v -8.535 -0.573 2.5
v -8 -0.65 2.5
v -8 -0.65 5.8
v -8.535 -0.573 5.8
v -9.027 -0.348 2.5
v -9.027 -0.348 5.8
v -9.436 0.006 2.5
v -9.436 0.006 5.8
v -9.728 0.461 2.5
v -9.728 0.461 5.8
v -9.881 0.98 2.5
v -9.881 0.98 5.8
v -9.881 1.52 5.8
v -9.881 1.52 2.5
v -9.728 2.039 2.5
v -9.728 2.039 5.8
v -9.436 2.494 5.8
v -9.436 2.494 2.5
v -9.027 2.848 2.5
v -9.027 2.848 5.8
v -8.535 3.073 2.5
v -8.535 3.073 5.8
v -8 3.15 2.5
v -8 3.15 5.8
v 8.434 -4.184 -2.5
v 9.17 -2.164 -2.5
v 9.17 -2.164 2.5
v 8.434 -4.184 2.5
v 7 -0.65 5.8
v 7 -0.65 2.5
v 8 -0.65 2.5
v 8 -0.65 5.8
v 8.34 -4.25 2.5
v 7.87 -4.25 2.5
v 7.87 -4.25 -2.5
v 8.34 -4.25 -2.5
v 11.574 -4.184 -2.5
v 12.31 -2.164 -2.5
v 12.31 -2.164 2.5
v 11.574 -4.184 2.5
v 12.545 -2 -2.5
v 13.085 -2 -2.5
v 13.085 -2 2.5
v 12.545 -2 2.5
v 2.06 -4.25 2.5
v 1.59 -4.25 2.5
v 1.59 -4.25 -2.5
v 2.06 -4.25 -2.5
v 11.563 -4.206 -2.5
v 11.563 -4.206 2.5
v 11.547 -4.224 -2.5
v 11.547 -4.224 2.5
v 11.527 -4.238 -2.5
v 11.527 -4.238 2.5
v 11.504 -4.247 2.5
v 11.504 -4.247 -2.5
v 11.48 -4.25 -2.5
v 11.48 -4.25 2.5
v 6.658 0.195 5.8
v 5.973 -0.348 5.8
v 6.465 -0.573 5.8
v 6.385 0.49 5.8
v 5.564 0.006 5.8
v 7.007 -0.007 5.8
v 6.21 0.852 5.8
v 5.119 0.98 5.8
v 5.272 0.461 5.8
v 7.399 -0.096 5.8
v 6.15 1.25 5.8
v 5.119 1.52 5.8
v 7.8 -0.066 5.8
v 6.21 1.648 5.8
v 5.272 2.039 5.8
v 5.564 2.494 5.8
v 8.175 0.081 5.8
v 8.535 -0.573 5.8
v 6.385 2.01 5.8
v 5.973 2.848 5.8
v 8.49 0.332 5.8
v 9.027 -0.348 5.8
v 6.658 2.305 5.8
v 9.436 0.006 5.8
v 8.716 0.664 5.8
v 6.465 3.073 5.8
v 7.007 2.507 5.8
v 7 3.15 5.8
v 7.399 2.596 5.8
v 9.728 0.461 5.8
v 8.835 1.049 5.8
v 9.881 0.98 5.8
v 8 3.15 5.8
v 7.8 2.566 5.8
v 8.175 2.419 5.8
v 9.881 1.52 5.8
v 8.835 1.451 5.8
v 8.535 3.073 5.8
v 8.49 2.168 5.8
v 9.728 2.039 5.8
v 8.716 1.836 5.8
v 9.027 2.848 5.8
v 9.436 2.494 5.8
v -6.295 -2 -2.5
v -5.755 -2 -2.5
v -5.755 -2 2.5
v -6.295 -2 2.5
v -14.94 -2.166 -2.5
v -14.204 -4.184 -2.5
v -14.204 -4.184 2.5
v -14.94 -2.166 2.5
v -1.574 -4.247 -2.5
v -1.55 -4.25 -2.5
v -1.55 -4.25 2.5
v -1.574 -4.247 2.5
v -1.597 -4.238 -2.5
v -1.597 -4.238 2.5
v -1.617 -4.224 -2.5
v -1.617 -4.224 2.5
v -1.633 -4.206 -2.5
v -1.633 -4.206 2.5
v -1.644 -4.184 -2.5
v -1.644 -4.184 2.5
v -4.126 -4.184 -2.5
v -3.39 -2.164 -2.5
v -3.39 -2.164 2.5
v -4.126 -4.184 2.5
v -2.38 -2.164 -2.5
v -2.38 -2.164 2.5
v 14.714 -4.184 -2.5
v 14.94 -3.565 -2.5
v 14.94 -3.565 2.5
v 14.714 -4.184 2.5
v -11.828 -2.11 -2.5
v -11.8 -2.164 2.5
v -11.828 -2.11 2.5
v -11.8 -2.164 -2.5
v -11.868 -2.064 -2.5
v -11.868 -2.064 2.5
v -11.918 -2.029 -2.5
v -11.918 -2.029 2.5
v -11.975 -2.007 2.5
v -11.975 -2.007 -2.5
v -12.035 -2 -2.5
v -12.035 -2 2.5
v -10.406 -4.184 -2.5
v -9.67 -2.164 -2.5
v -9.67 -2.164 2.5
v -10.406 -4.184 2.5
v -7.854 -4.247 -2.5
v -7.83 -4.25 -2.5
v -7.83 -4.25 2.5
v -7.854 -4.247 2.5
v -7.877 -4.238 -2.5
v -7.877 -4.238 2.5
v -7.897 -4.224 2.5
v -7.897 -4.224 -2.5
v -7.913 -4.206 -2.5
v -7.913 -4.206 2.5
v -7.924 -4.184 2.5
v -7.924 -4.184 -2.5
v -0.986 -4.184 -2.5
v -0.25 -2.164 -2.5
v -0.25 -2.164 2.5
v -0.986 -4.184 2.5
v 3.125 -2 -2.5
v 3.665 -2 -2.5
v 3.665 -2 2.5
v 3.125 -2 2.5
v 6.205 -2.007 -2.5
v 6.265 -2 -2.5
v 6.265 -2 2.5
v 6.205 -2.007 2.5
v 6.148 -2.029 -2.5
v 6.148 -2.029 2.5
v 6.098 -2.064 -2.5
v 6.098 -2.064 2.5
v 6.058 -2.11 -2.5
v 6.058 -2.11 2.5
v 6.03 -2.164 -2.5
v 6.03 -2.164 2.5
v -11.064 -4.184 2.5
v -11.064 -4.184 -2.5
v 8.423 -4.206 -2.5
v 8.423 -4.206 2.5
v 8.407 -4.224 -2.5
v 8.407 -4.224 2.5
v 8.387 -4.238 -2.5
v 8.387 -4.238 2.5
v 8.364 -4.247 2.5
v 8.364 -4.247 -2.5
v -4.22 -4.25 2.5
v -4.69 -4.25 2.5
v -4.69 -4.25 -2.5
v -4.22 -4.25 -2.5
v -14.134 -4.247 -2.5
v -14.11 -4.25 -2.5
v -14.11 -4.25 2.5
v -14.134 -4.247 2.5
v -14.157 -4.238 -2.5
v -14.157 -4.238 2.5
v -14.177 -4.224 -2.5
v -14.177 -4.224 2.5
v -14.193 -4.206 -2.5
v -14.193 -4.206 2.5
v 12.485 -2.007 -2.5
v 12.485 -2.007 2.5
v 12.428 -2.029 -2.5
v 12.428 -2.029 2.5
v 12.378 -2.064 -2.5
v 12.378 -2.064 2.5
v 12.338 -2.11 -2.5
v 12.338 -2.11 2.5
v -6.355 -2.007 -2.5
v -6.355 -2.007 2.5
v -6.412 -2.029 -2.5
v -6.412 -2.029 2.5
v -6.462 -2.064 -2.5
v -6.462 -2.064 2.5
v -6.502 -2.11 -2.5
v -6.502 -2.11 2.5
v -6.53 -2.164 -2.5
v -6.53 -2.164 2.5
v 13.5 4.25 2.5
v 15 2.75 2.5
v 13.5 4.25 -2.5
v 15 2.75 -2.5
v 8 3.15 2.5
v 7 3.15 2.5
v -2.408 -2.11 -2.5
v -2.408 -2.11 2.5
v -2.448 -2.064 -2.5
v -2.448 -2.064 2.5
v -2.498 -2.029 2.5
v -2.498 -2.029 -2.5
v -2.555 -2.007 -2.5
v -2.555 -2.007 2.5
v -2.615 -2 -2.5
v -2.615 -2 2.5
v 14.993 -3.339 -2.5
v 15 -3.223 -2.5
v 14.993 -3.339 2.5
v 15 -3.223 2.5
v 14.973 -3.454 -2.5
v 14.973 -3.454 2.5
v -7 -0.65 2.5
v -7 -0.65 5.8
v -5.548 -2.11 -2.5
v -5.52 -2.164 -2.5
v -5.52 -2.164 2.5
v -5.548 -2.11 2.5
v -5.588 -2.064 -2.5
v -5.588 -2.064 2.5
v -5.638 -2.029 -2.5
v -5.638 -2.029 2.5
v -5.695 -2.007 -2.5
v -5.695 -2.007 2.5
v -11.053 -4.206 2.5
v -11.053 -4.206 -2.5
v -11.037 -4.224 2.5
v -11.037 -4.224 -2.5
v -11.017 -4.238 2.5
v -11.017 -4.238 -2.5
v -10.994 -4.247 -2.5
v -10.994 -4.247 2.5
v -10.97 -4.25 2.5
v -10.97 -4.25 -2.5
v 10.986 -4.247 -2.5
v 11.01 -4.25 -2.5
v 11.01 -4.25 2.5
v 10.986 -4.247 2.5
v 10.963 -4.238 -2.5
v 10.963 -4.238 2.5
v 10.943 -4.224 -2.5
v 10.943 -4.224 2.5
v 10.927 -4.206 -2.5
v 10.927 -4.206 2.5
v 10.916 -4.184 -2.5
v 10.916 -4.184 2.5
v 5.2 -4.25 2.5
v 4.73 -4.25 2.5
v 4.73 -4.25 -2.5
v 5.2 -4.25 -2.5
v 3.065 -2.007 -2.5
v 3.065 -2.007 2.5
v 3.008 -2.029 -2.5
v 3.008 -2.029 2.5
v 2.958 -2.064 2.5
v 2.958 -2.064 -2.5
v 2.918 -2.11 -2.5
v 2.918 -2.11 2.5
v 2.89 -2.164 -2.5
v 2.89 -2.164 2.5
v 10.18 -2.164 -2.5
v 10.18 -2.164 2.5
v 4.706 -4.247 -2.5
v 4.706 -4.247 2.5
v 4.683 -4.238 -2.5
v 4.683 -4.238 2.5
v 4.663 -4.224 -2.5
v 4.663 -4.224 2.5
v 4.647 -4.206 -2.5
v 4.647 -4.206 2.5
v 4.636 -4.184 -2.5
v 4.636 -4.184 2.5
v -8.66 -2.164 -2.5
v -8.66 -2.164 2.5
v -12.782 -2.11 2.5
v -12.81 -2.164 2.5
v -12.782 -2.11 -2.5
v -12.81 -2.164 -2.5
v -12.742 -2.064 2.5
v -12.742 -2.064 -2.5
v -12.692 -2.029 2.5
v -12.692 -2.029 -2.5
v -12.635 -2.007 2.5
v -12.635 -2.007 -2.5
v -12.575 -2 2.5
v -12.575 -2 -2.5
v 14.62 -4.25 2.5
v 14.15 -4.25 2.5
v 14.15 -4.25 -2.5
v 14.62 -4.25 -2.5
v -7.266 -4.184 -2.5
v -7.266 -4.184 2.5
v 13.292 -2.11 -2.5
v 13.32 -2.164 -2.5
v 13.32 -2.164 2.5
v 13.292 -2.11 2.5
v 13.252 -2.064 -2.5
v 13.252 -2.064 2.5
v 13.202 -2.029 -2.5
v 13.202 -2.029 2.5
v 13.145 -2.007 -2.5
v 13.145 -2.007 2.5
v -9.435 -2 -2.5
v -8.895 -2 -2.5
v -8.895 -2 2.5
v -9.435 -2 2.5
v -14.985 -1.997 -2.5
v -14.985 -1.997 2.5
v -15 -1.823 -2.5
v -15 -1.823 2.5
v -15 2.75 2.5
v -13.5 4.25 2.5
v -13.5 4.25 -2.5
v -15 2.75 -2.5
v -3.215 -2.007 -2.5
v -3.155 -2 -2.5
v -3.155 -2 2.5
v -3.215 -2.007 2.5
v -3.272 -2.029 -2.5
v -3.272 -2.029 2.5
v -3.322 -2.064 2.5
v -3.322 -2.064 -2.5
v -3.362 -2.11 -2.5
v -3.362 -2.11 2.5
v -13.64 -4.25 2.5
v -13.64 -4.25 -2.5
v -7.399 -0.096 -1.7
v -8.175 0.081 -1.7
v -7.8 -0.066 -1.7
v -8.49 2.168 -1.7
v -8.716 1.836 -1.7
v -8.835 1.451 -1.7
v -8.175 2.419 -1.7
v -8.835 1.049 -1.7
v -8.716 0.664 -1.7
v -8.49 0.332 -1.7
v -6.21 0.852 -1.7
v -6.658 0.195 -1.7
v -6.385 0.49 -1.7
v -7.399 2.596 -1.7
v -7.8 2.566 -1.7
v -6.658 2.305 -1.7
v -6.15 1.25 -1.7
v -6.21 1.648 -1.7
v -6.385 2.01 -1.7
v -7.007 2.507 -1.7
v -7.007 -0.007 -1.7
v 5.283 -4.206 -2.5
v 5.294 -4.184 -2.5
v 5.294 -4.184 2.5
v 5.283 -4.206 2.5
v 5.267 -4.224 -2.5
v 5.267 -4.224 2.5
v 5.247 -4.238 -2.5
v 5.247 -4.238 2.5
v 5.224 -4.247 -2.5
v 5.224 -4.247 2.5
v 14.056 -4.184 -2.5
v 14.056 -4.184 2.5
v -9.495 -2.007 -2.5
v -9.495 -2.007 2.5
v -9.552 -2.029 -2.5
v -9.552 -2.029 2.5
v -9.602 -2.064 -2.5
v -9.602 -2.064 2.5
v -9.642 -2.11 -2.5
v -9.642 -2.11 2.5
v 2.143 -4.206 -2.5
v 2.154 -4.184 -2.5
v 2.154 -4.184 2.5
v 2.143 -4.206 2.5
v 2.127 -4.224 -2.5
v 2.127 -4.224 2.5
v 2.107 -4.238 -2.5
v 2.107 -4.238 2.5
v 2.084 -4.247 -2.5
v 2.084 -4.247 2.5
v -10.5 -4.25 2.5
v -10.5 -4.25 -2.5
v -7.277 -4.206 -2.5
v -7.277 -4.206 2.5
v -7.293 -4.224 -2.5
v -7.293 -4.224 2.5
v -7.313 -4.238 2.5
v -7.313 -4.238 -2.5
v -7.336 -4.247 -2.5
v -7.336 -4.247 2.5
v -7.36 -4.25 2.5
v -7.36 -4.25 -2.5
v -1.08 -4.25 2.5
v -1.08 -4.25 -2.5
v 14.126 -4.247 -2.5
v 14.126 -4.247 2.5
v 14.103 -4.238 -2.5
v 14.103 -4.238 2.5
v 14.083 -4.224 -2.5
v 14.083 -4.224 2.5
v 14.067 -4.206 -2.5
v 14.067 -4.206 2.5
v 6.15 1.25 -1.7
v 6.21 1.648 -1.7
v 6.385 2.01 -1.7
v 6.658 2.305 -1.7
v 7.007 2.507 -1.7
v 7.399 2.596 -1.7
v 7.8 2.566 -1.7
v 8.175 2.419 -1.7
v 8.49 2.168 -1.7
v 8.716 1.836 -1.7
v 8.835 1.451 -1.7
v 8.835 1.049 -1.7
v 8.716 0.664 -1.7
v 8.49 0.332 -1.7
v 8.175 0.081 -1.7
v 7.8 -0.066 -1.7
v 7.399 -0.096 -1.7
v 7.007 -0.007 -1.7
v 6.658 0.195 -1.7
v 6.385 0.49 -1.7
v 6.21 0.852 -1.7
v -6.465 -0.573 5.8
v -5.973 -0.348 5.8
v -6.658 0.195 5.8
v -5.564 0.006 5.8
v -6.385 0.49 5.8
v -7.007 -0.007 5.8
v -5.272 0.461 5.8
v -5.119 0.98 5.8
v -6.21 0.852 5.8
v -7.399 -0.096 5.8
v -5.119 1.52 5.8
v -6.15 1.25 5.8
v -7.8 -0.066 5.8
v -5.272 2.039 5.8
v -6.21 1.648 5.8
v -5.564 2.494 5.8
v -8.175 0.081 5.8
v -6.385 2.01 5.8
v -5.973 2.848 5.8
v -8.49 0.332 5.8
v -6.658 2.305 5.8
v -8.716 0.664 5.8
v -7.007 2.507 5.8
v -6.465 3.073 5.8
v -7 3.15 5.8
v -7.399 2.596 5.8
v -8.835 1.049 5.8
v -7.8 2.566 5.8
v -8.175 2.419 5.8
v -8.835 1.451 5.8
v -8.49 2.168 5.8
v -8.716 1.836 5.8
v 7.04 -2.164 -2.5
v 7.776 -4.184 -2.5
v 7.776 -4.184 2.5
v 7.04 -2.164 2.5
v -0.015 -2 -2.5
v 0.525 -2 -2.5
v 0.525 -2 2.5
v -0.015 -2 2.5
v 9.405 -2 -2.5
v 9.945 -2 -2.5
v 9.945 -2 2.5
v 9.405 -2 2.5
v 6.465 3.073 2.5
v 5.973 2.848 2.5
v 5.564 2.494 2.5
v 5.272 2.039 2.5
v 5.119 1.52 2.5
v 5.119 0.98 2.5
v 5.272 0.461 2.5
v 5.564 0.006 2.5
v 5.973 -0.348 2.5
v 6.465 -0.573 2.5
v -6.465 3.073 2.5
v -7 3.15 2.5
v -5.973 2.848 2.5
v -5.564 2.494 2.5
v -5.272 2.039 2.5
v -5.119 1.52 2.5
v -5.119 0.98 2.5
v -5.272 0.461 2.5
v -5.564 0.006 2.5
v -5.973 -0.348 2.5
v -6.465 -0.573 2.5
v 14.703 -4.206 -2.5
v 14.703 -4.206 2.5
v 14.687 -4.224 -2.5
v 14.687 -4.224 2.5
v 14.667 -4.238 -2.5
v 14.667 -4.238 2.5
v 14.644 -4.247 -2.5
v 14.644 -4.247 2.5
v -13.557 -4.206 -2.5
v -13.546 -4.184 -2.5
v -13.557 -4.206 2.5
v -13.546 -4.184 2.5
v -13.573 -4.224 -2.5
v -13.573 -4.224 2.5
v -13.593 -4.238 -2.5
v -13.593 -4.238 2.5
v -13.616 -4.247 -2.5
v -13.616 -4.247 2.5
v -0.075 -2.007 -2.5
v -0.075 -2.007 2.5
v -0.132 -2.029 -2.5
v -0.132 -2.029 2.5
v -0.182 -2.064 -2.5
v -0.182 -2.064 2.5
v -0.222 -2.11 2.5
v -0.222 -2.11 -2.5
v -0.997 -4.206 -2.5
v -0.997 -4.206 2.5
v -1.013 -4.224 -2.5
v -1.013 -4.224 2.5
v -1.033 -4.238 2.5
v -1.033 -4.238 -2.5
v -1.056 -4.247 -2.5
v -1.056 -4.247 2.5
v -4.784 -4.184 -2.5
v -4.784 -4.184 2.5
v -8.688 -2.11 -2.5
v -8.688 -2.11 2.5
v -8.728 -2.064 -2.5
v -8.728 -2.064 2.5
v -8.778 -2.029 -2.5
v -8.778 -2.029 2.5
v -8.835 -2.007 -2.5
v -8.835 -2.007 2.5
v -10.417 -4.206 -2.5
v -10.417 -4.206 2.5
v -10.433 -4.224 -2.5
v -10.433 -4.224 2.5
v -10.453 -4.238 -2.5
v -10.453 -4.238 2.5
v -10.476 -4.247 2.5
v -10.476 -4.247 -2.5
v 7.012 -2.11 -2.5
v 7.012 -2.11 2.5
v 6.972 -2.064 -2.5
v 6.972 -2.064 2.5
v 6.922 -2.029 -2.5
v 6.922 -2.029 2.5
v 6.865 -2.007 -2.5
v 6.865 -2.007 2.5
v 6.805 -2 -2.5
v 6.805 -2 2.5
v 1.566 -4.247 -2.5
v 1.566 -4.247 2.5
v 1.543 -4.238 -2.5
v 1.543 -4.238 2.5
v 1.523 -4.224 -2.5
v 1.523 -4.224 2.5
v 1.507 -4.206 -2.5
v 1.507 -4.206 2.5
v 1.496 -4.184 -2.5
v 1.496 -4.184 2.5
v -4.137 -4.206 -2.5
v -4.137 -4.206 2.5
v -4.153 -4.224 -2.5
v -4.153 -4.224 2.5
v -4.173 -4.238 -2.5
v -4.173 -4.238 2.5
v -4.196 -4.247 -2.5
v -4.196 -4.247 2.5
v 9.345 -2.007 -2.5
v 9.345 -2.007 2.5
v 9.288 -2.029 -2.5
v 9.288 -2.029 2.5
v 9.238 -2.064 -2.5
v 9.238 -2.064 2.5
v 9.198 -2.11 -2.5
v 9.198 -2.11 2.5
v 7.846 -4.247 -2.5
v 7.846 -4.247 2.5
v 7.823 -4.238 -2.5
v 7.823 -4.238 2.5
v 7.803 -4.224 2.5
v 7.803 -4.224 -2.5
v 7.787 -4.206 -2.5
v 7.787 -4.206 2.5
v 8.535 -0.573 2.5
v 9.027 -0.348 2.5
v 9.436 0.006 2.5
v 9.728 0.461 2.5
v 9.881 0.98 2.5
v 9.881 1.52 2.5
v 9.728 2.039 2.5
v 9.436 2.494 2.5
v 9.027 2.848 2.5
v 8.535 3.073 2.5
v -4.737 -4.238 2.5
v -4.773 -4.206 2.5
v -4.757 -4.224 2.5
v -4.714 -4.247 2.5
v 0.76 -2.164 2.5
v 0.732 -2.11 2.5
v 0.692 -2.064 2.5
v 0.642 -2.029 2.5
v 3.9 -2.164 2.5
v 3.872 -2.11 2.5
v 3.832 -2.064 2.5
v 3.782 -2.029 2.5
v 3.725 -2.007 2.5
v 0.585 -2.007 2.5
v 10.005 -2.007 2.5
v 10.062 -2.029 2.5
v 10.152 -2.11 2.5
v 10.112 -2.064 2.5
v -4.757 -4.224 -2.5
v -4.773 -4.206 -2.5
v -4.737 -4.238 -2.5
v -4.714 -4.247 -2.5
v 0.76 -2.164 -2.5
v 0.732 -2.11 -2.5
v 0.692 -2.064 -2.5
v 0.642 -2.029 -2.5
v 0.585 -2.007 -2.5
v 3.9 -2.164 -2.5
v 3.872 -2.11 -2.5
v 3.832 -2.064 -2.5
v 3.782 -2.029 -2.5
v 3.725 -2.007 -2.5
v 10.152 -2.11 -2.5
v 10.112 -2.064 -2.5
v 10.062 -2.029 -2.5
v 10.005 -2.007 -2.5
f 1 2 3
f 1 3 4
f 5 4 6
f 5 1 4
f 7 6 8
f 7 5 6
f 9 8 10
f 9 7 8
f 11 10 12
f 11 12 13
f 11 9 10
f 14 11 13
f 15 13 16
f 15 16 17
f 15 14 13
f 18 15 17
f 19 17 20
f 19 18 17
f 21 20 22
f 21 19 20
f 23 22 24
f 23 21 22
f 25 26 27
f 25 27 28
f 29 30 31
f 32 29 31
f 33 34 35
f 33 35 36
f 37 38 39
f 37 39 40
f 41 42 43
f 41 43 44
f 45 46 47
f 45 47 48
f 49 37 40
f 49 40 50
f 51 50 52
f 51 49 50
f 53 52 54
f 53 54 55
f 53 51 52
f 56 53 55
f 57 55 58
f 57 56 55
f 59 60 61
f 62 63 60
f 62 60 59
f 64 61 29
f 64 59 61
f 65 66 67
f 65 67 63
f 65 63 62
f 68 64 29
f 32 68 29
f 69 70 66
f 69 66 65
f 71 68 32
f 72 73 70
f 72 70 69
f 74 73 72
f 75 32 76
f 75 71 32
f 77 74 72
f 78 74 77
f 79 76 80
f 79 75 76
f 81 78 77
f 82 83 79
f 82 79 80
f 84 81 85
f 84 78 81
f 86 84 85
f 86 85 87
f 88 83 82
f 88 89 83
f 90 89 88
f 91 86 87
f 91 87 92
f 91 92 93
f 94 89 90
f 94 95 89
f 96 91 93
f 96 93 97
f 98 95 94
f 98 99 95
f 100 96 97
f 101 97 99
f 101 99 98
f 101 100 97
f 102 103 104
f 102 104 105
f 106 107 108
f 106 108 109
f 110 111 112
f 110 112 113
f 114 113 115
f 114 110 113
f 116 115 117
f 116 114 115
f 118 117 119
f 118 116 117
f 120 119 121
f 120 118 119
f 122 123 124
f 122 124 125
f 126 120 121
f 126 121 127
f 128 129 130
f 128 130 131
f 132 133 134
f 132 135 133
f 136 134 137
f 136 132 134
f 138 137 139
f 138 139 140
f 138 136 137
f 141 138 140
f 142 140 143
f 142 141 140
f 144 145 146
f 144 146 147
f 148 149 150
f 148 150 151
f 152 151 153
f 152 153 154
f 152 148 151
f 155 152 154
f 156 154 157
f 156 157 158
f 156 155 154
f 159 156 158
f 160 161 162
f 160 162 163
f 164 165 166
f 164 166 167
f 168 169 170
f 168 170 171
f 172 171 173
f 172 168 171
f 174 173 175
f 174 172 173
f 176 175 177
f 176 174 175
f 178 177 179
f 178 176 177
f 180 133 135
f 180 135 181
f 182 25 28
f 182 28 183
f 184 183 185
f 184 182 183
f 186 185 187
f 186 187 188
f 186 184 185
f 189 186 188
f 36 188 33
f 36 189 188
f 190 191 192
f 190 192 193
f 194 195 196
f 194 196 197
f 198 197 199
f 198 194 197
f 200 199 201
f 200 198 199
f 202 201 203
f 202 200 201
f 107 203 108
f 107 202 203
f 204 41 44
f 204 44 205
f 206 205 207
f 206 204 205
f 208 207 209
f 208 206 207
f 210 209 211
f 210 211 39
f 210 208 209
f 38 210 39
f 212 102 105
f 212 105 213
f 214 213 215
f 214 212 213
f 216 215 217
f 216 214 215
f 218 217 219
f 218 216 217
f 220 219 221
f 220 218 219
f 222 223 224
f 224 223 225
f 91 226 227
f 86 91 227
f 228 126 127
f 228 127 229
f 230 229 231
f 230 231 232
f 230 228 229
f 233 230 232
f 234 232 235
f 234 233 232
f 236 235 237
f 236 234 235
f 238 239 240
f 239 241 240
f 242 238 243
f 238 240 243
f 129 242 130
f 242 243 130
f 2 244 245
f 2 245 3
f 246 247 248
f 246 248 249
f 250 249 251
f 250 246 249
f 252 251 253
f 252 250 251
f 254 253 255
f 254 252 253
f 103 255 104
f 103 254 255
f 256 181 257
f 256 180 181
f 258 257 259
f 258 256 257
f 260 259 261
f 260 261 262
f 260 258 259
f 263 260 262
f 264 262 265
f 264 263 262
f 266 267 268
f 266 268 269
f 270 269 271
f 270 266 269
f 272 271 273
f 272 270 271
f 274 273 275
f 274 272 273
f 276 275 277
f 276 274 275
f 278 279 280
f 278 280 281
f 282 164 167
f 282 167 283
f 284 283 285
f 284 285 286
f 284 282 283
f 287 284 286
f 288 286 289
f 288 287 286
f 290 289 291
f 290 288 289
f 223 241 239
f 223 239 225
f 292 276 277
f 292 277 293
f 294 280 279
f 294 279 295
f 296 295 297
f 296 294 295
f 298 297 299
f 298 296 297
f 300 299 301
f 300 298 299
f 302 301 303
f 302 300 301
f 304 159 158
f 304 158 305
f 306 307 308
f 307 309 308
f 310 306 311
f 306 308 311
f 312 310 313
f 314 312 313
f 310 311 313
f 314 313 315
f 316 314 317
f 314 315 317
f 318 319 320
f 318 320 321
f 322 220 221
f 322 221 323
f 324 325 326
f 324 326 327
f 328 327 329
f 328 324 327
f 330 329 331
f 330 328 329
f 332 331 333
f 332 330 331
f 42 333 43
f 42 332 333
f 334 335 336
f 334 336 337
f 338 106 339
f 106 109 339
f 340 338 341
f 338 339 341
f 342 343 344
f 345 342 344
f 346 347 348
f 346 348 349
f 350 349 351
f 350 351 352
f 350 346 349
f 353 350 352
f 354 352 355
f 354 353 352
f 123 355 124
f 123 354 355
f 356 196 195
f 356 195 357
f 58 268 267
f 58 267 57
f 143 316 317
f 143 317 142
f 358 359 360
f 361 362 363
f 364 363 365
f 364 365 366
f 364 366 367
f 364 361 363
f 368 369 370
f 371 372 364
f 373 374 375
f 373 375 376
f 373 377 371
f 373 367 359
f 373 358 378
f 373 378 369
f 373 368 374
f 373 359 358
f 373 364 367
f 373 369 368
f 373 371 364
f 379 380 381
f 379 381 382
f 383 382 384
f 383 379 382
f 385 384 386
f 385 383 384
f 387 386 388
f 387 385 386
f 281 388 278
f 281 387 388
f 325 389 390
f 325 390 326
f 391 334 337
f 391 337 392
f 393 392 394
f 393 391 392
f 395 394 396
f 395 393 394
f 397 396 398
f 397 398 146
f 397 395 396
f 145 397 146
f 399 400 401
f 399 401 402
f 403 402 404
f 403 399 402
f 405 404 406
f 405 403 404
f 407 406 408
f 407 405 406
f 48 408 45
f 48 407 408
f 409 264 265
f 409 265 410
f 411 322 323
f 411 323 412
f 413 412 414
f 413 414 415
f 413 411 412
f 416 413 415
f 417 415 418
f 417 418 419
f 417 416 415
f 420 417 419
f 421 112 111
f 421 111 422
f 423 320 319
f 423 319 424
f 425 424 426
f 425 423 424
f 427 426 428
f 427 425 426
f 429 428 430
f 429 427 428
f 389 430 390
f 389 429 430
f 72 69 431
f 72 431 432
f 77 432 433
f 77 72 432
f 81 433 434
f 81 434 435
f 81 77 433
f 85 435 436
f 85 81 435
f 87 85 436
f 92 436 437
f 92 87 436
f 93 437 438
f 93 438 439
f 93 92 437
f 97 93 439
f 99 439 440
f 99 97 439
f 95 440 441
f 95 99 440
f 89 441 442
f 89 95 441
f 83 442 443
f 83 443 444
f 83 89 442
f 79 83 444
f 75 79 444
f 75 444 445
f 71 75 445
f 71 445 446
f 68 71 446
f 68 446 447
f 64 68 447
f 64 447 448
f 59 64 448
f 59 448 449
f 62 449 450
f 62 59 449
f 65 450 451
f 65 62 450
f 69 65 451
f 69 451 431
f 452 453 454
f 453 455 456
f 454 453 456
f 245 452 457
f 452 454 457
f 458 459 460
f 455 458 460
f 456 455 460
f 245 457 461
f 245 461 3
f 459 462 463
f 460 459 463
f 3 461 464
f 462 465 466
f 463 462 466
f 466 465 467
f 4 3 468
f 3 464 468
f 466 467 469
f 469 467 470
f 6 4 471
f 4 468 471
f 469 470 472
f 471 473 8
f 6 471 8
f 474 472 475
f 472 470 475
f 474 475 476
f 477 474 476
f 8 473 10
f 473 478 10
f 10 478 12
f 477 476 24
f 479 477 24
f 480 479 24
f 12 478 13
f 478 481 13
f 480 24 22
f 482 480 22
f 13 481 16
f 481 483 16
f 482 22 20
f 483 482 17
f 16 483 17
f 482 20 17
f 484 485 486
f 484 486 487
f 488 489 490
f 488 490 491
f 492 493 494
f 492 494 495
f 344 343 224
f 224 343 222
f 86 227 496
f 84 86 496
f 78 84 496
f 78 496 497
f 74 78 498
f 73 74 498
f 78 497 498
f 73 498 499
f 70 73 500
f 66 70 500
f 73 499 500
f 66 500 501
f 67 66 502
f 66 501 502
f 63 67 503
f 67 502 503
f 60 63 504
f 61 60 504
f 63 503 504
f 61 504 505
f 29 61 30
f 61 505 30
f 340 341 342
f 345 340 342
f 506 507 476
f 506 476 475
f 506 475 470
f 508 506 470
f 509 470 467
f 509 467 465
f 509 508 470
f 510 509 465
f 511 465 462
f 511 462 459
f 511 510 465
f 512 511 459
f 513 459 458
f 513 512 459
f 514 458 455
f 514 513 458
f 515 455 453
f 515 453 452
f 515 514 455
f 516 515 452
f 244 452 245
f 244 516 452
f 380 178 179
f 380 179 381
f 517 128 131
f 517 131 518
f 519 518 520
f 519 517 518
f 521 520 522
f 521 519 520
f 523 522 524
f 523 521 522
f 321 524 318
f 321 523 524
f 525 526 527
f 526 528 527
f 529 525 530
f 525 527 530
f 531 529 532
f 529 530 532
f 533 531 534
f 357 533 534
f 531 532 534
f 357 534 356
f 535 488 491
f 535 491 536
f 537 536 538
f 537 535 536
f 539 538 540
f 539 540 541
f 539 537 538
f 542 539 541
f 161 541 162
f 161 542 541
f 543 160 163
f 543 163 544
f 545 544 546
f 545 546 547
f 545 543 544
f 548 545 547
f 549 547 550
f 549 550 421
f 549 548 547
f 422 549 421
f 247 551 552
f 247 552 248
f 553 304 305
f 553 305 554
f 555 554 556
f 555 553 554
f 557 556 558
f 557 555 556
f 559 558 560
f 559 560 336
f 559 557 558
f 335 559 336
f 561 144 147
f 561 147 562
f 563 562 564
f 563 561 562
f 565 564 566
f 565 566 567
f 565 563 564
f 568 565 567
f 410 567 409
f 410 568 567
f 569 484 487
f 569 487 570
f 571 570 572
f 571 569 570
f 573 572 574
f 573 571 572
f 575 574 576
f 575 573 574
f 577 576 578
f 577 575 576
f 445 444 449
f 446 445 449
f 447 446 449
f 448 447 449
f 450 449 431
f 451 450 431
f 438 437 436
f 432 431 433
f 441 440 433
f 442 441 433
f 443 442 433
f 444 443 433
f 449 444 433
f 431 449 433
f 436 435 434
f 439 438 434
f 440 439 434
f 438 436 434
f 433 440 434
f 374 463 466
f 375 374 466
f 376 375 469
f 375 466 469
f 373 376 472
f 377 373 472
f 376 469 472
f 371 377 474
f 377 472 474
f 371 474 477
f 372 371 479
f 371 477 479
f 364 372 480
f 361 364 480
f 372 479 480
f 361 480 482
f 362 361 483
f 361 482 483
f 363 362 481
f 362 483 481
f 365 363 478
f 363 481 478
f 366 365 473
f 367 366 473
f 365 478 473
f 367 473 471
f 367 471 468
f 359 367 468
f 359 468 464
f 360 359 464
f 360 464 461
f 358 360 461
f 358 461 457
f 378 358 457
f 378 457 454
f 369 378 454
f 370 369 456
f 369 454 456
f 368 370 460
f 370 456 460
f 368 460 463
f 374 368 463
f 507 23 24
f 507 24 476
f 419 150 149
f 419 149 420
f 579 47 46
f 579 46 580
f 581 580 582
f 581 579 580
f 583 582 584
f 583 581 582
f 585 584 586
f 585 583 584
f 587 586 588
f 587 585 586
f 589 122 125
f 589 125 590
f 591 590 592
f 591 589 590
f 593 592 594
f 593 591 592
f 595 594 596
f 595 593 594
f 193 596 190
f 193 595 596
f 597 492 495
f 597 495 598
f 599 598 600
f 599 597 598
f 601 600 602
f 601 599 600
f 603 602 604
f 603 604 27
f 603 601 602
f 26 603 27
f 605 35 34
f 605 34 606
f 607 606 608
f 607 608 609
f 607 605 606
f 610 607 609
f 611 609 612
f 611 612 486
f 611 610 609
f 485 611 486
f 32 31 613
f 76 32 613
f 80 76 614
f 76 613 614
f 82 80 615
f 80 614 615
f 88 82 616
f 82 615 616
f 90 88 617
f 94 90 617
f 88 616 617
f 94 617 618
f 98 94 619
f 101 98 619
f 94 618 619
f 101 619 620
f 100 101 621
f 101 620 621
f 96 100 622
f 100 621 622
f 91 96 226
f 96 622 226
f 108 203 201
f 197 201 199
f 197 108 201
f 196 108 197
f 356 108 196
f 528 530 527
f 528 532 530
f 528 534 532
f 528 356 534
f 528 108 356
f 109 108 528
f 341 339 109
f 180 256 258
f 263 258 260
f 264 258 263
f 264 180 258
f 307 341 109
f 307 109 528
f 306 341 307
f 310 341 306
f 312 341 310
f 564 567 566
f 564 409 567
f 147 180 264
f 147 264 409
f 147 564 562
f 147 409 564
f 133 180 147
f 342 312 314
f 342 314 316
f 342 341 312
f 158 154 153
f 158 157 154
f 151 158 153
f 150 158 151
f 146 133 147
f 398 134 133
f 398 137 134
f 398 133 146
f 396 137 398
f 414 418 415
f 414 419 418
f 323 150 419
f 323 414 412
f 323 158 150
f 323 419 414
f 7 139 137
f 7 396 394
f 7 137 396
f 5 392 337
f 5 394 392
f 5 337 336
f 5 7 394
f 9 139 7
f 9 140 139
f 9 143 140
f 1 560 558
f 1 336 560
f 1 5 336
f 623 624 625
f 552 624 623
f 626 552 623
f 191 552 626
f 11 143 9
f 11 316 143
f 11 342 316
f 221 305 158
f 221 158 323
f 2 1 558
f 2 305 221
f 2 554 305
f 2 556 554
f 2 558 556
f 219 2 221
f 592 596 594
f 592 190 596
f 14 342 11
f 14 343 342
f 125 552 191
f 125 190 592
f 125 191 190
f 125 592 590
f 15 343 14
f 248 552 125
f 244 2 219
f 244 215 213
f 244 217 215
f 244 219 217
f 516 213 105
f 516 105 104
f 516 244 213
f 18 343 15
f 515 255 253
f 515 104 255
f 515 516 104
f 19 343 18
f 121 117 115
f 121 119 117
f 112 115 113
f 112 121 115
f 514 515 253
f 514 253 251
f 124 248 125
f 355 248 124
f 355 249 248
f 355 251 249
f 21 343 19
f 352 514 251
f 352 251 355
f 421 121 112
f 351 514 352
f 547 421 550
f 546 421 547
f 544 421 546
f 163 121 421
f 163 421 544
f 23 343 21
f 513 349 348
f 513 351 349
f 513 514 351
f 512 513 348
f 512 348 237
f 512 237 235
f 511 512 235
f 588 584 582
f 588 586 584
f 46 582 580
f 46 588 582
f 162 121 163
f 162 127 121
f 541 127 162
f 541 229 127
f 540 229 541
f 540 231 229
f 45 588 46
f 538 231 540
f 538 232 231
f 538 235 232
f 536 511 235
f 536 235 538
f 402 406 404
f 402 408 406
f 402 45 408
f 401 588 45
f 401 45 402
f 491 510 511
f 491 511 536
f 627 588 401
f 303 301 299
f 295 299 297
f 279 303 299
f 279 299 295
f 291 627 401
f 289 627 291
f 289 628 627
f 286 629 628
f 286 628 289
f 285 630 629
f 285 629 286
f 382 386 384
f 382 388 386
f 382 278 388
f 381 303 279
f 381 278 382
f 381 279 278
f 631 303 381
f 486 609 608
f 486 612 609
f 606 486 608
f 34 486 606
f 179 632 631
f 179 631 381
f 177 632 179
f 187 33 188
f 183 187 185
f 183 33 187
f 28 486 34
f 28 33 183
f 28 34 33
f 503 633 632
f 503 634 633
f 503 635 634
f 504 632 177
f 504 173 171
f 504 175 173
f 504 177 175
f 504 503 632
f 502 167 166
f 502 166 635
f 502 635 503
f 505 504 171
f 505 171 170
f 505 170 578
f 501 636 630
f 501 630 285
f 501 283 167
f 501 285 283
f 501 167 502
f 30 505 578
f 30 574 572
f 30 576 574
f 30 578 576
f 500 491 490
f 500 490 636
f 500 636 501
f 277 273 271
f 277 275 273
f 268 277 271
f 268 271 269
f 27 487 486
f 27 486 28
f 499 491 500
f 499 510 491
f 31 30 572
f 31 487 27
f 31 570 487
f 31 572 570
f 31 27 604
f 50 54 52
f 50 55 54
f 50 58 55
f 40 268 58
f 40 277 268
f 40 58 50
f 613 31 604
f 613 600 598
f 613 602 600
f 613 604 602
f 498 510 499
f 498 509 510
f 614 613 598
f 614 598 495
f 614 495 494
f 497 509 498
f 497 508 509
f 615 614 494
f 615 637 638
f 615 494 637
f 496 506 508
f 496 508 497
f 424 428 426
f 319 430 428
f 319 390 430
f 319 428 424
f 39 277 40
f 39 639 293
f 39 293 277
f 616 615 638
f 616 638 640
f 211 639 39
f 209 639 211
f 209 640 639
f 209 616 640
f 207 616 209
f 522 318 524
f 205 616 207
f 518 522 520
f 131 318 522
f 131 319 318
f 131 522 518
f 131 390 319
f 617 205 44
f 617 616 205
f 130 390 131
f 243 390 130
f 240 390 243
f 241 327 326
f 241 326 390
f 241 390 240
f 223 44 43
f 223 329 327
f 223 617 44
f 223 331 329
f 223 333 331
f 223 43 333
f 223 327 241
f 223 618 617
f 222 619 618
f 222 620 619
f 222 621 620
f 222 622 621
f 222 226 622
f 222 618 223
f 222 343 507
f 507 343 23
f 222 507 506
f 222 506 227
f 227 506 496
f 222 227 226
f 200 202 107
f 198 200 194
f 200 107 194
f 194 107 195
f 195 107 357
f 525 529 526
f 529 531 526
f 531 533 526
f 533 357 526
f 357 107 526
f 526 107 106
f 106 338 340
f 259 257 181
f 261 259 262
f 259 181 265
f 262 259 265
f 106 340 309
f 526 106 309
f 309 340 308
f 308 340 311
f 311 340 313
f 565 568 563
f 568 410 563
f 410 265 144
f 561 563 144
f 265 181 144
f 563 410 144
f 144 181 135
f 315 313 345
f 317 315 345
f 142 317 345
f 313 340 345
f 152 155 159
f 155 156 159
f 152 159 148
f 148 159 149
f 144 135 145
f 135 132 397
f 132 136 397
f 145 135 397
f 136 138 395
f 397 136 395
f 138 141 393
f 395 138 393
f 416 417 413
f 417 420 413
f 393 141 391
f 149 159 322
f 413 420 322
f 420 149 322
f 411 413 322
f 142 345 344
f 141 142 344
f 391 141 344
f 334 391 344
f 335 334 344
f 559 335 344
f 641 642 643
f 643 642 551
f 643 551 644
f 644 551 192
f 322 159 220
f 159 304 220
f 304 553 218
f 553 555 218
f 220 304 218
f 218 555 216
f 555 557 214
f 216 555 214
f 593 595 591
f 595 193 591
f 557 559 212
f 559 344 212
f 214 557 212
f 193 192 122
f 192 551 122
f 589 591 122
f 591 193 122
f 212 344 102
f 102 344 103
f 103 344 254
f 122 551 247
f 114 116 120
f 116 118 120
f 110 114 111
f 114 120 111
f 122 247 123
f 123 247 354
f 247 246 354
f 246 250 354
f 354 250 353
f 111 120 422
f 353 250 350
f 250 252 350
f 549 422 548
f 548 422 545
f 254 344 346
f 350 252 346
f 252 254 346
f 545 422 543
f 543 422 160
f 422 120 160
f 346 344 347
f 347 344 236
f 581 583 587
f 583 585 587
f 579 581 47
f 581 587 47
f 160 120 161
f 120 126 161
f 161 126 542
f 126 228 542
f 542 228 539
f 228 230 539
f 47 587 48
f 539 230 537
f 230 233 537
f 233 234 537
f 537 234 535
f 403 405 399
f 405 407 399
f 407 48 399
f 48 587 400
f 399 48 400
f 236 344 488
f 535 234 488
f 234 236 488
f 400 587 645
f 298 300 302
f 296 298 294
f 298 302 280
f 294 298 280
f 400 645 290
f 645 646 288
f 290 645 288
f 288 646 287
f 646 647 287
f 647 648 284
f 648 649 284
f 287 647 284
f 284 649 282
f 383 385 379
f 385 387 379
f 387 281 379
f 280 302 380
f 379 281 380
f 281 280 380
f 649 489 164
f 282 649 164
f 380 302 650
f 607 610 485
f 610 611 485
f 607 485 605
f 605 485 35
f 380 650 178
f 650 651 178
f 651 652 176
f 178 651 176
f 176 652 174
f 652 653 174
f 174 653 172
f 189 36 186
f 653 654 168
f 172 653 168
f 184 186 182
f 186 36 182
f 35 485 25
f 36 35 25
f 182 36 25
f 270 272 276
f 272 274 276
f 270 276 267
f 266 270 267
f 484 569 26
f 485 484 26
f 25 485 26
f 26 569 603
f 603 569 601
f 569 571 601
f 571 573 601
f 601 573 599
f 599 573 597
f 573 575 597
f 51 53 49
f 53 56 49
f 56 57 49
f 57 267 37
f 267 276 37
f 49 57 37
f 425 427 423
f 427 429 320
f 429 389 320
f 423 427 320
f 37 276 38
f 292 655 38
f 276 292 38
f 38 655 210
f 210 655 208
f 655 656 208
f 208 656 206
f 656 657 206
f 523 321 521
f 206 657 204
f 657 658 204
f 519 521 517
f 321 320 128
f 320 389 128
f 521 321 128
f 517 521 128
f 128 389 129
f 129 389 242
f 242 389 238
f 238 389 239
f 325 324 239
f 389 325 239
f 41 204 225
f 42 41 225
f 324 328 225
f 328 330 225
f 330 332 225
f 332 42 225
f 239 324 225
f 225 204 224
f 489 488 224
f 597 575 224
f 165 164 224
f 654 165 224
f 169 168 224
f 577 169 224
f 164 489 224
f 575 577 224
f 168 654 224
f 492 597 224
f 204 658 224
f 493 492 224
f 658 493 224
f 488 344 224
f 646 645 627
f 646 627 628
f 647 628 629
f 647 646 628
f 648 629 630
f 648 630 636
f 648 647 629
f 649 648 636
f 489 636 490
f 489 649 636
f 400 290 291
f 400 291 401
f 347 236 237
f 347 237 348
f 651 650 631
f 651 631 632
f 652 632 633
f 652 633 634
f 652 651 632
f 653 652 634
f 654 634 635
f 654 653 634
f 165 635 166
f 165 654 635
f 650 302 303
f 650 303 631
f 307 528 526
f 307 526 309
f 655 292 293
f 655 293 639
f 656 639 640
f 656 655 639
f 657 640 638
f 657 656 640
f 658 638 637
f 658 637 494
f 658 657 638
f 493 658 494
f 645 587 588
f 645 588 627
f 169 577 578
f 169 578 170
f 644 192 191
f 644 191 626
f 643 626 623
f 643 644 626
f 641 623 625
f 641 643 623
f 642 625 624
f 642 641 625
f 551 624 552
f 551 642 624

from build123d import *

# Parameters (mm, degrees)
SZKIC1_W                    = 30
SZKIC1_H                    = 8.5
DODANIE_WYCI_GNI_CIE1_DEPTH = 2.5
WYTNIJ_WYCI_GNI_CIE1_DEPTH  = 16.789632675
ZAOKR_GLENIE1_R             = 0.25
ZAOKR_GLENIE2_R             = 0.1
SZYK_START                  = -2.5
SZYK_LINIOWY1_DEPTH         = 5
ZAOKR_GLENIE3_R             = 1
DODANIE_WYCI_GNI_CIE2_DEPTH = 3.3
SZKIC4_R                    = 1.35
WYTNIJ_WYCI_GNI_CIE2_DEPTH  = 7.5
SFAZOWANIE1_SIZE            = 1.5


# Read off the part's stored shape, not the designer's step: Szyk liniowy1
with BuildPart() as part:
    # Szkic1 → Dodanie-wyciągnięcie1 (new, symmetric)
    with BuildSketch(Plane.XY):
        Rectangle(SZKIC1_W, SZKIC1_H)
    extrude(amount=DODANIE_WYCI_GNI_CIE1_DEPTH, both=True)

    # Szkic2 → Wytnij-wyciągnięcie1 (cut, symmetric)
    with BuildSketch(Plane.XY):
        Polygon((-13.57, -4.25), (-12.75, -2), (-11.86, -2), (-11.04, -4.25), align=None)
    extrude(amount=WYTNIJ_WYCI_GNI_CIE1_DEPTH, both=True, mode=Mode.SUBTRACT)

    # Zaokrąglenie1
    zaokr_glenie1_edges = [part.edges().sort_by_distance(p)[0] for p in [
        (-12.75, -2, 0),
        (-11.86, -2, 0),
    ]]
    fillet(zaokr_glenie1_edges, radius=ZAOKR_GLENIE1_R)

    # Zaokrąglenie2
    zaokr_glenie2_edges = [part.edges().sort_by_distance(p)[0] for p in [
        (-11.04, -4.25, 0),
        (-13.57, -4.25, 0),
    ]]
    fillet(zaokr_glenie2_edges, radius=ZAOKR_GLENIE2_R)

    # Szyk liniowy1 outline → Szyk liniowy1 (cut)
    with BuildSketch(Plane.XY.offset(SZYK_START)):
        with BuildLine():
            ThreePointArc((-8.660086567, -2.164396615), (-8.751622667, -2.045181975), (-8.894973903, -2))
            Line((-8.894973903, -2), (-9.435026097, -2))
            ThreePointArc((-9.435026097, -2), (-9.578377333, -2.045181975), (-9.669913433, -2.164396615))
            Line((-9.669913433, -2.164396615), (-10.406034627, -4.184241354))
            ThreePointArc((-10.406034627, -4.184241354), (-10.442649067, -4.23192721), (-10.499989561, -4.25))
            Line((-10.499989561, -4.25), (-7.830010439, -4.25))
            ThreePointArc((-7.830010439, -4.25), (-7.887350933, -4.23192721), (-7.923965373, -4.184241354))
            Line((-7.923965373, -4.184241354), (-8.660086567, -2.164396615))
        make_face()
        with BuildLine():
            ThreePointArc((14.713965373, -4.184241354), (14.677350933, -4.23192721), (14.620010439, -4.25))
            Line((14.620010439, -4.25), (15, -4.25))
            Line((15, -4.25), (15, -3.399390244))
            Line((15, -3.399390244), (14.713965373, -4.184241354))
        make_face()
        with BuildLine():
            ThreePointArc((11.573965373, -4.184241354), (11.537350933, -4.23192721), (11.480010439, -4.25))
            Line((11.480010439, -4.25), (14.149989561, -4.25))
            ThreePointArc((14.149989561, -4.25), (14.092649067, -4.23192721), (14.056034627, -4.184241354))
            Line((14.056034627, -4.184241354), (13.319913433, -2.164396615))
            ThreePointArc((13.319913433, -2.164396615), (13.228377333, -2.045181975), (13.085026097, -2))
            Line((13.085026097, -2), (12.544973903, -2))
            ThreePointArc((12.544973903, -2), (12.401622667, -2.045181975), (12.310086567, -2.164396615))
            Line((12.310086567, -2.164396615), (11.573965373, -4.184241354))
        make_face()
        with BuildLine():
            ThreePointArc((8.433965373, -4.184241354), (8.397350933, -4.23192721), (8.340010439, -4.25))
            Line((8.340010439, -4.25), (11.009989561, -4.25))
            ThreePointArc((11.009989561, -4.25), (10.952649067, -4.23192721), (10.916034627, -4.184241354))
            Line((10.916034627, -4.184241354), (10.179913433, -2.164396615))
            ThreePointArc((10.179913433, -2.164396615), (10.088377333, -2.045181975), (9.945026097, -2))
            Line((9.945026097, -2), (9.404973903, -2))
            ThreePointArc((9.404973903, -2), (9.261622667, -2.045181975), (9.170086567, -2.164396615))
            Line((9.170086567, -2.164396615), (8.433965373, -4.184241354))
        make_face()
        with BuildLine():
            ThreePointArc((5.293965373, -4.184241354), (5.257350933, -4.23192721), (5.200010439, -4.25))
            Line((5.200010439, -4.25), (7.869989561, -4.25))
            ThreePointArc((7.869989561, -4.25), (7.812649067, -4.23192721), (7.776034627, -4.184241354))
            Line((7.776034627, -4.184241354), (7.039913433, -2.164396615))
            ThreePointArc((7.039913433, -2.164396615), (6.948377333, -2.045181975), (6.805026097, -2))
            Line((6.805026097, -2), (6.264973903, -2))
            ThreePointArc((6.264973903, -2), (6.121622667, -2.045181975), (6.030086567, -2.164396615))
            Line((6.030086567, -2.164396615), (5.293965373, -4.184241354))
        make_face()
        with BuildLine():
            ThreePointArc((2.153965373, -4.184241354), (2.117350933, -4.23192721), (2.060010439, -4.25))
            Line((2.060010439, -4.25), (4.729989561, -4.25))
            ThreePointArc((4.729989561, -4.25), (4.672649067, -4.23192721), (4.636034627, -4.184241354))
            Line((4.636034627, -4.184241354), (3.899913433, -2.164396615))
            ThreePointArc((3.899913433, -2.164396615), (3.808377333, -2.045181975), (3.665026097, -2))
            Line((3.665026097, -2), (3.124973903, -2))
            ThreePointArc((3.124973903, -2), (2.981622667, -2.045181975), (2.890086567, -2.164396615))
            Line((2.890086567, -2.164396615), (2.153965373, -4.184241354))
        make_face()
        with BuildLine():
            ThreePointArc((-0.986034627, -4.184241354), (-1.022649067, -4.23192721), (-1.079989561, -4.25))
            Line((-1.079989561, -4.25), (1.589989561, -4.25))
            ThreePointArc((1.589989561, -4.25), (1.532649067, -4.23192721), (1.496034627, -4.184241354))
            Line((1.496034627, -4.184241354), (0.759913433, -2.164396615))
            ThreePointArc((0.759913433, -2.164396615), (0.668377333, -2.045181975), (0.525026097, -2))
            Line((0.525026097, -2), (-0.015026097, -2))
            ThreePointArc((-0.015026097, -2), (-0.158377333, -2.045181975), (-0.249913433, -2.164396615))
            Line((-0.249913433, -2.164396615), (-0.986034627, -4.184241354))
        make_face()
        with BuildLine():
            ThreePointArc((-4.126034627, -4.184241354), (-4.162649067, -4.23192721), (-4.219989561, -4.25))
            Line((-4.219989561, -4.25), (-1.550010439, -4.25))
            ThreePointArc((-1.550010439, -4.25), (-1.607350933, -4.23192721), (-1.643965373, -4.184241354))
            Line((-1.643965373, -4.184241354), (-2.380086567, -2.164396615))
            ThreePointArc((-2.380086567, -2.164396615), (-2.471622667, -2.045181975), (-2.614973903, -2))
            Line((-2.614973903, -2), (-3.155026097, -2))
            ThreePointArc((-3.155026097, -2), (-3.298377333, -2.045181975), (-3.389913433, -2.164396615))
            Line((-3.389913433, -2.164396615), (-4.126034627, -4.184241354))
        make_face()
        with BuildLine():
            ThreePointArc((-7.266034627, -4.184241354), (-7.302649067, -4.23192721), (-7.359989561, -4.25))
            Line((-7.359989561, -4.25), (-4.690010439, -4.25))
            ThreePointArc((-4.690010439, -4.25), (-4.747350933, -4.23192721), (-4.783965373, -4.184241354))
            Line((-4.783965373, -4.184241354), (-5.520086567, -2.164396615))
            ThreePointArc((-5.520086567, -2.164396615), (-5.611622667, -2.045181975), (-5.754973903, -2))
            Line((-5.754973903, -2), (-6.295026097, -2))
            ThreePointArc((-6.295026097, -2), (-6.438377333, -2.045181975), (-6.529913433, -2.164396615))
            Line((-6.529913433, -2.164396615), (-7.266034627, -4.184241354))
        make_face()
        with BuildLine():
            Line((-15, -4.25), (-14.110010439, -4.25))
            ThreePointArc((-14.110010439, -4.25), (-14.167350933, -4.23192721), (-14.203965373, -4.184241354))
            Line((-14.203965373, -4.184241354), (-14.940086567, -2.164396615))
            ThreePointArc((-14.940086567, -2.164396615), (-14.964838585, -2.11456312), (-15, -2.071438713))
            Line((-15, -2.071438713), (-15, -4.25))
        make_face()
    extrude(amount=SZYK_LINIOWY1_DEPTH, mode=Mode.SUBTRACT)

    # Zaokrąglenie3
    zaokr_glenie3_edges = [part.edges().sort_by_distance(p)[0] for p in [
        (-15, -2.071438713, 0),
        (15, -3.399390244, 0),
    ]]
    fillet(zaokr_glenie3_edges, radius=ZAOKR_GLENIE3_R)

    # Szkic3 → Dodanie-wyciągnięcie2 (add)
    with BuildSketch(Plane.XY.offset(2.5)):
        with BuildLine():
            Line((-8, 3.15), (-7, 3.15))
            ThreePointArc((-7, 3.15), (-5.1, 1.25), (-7, -0.65))
            Line((-7, -0.65), (-8, -0.65))
            ThreePointArc((-8, -0.65), (-9.9, 1.25), (-8, 3.15))
        make_face()
    dodanie_wyci_gni_cie2 = extrude(amount=DODANIE_WYCI_GNI_CIE2_DEPTH)

    # Szkic4 → Wytnij-wyciągnięcie2 (cut)
    with BuildSketch(Plane.XY.offset(5.8)):
        with Locations((-7.5, 1.25)):
            Circle(SZKIC4_R)
    wytnij_wyci_gni_cie2 = extrude(amount=-WYTNIJ_WYCI_GNI_CIE2_DEPTH, mode=Mode.SUBTRACT)

    # Lustro1: Dodanie-wyciągnięcie2, Wytnij-wyciągnięcie2 across plane
    add(dodanie_wyci_gni_cie2.mirror(Plane(origin=(0, 0, 0), x_dir=(0, 0, 1), z_dir=(1, 0, 0))))
    add(wytnij_wyci_gni_cie2.mirror(Plane(origin=(0, 0, 0), x_dir=(0, 0, 1), z_dir=(1, 0, 0))), mode=Mode.SUBTRACT)

    # Sfazowanie1
    sfazowanie1_edges = [part.edges().sort_by_distance(p)[0] for p in [
        (-15, 4.25, 0),
        (15, 4.25, 0),
    ]]
    chamfer(sfazowanie1_edges, length=SFAZOWANIE1_SIZE)


solid = part.part
